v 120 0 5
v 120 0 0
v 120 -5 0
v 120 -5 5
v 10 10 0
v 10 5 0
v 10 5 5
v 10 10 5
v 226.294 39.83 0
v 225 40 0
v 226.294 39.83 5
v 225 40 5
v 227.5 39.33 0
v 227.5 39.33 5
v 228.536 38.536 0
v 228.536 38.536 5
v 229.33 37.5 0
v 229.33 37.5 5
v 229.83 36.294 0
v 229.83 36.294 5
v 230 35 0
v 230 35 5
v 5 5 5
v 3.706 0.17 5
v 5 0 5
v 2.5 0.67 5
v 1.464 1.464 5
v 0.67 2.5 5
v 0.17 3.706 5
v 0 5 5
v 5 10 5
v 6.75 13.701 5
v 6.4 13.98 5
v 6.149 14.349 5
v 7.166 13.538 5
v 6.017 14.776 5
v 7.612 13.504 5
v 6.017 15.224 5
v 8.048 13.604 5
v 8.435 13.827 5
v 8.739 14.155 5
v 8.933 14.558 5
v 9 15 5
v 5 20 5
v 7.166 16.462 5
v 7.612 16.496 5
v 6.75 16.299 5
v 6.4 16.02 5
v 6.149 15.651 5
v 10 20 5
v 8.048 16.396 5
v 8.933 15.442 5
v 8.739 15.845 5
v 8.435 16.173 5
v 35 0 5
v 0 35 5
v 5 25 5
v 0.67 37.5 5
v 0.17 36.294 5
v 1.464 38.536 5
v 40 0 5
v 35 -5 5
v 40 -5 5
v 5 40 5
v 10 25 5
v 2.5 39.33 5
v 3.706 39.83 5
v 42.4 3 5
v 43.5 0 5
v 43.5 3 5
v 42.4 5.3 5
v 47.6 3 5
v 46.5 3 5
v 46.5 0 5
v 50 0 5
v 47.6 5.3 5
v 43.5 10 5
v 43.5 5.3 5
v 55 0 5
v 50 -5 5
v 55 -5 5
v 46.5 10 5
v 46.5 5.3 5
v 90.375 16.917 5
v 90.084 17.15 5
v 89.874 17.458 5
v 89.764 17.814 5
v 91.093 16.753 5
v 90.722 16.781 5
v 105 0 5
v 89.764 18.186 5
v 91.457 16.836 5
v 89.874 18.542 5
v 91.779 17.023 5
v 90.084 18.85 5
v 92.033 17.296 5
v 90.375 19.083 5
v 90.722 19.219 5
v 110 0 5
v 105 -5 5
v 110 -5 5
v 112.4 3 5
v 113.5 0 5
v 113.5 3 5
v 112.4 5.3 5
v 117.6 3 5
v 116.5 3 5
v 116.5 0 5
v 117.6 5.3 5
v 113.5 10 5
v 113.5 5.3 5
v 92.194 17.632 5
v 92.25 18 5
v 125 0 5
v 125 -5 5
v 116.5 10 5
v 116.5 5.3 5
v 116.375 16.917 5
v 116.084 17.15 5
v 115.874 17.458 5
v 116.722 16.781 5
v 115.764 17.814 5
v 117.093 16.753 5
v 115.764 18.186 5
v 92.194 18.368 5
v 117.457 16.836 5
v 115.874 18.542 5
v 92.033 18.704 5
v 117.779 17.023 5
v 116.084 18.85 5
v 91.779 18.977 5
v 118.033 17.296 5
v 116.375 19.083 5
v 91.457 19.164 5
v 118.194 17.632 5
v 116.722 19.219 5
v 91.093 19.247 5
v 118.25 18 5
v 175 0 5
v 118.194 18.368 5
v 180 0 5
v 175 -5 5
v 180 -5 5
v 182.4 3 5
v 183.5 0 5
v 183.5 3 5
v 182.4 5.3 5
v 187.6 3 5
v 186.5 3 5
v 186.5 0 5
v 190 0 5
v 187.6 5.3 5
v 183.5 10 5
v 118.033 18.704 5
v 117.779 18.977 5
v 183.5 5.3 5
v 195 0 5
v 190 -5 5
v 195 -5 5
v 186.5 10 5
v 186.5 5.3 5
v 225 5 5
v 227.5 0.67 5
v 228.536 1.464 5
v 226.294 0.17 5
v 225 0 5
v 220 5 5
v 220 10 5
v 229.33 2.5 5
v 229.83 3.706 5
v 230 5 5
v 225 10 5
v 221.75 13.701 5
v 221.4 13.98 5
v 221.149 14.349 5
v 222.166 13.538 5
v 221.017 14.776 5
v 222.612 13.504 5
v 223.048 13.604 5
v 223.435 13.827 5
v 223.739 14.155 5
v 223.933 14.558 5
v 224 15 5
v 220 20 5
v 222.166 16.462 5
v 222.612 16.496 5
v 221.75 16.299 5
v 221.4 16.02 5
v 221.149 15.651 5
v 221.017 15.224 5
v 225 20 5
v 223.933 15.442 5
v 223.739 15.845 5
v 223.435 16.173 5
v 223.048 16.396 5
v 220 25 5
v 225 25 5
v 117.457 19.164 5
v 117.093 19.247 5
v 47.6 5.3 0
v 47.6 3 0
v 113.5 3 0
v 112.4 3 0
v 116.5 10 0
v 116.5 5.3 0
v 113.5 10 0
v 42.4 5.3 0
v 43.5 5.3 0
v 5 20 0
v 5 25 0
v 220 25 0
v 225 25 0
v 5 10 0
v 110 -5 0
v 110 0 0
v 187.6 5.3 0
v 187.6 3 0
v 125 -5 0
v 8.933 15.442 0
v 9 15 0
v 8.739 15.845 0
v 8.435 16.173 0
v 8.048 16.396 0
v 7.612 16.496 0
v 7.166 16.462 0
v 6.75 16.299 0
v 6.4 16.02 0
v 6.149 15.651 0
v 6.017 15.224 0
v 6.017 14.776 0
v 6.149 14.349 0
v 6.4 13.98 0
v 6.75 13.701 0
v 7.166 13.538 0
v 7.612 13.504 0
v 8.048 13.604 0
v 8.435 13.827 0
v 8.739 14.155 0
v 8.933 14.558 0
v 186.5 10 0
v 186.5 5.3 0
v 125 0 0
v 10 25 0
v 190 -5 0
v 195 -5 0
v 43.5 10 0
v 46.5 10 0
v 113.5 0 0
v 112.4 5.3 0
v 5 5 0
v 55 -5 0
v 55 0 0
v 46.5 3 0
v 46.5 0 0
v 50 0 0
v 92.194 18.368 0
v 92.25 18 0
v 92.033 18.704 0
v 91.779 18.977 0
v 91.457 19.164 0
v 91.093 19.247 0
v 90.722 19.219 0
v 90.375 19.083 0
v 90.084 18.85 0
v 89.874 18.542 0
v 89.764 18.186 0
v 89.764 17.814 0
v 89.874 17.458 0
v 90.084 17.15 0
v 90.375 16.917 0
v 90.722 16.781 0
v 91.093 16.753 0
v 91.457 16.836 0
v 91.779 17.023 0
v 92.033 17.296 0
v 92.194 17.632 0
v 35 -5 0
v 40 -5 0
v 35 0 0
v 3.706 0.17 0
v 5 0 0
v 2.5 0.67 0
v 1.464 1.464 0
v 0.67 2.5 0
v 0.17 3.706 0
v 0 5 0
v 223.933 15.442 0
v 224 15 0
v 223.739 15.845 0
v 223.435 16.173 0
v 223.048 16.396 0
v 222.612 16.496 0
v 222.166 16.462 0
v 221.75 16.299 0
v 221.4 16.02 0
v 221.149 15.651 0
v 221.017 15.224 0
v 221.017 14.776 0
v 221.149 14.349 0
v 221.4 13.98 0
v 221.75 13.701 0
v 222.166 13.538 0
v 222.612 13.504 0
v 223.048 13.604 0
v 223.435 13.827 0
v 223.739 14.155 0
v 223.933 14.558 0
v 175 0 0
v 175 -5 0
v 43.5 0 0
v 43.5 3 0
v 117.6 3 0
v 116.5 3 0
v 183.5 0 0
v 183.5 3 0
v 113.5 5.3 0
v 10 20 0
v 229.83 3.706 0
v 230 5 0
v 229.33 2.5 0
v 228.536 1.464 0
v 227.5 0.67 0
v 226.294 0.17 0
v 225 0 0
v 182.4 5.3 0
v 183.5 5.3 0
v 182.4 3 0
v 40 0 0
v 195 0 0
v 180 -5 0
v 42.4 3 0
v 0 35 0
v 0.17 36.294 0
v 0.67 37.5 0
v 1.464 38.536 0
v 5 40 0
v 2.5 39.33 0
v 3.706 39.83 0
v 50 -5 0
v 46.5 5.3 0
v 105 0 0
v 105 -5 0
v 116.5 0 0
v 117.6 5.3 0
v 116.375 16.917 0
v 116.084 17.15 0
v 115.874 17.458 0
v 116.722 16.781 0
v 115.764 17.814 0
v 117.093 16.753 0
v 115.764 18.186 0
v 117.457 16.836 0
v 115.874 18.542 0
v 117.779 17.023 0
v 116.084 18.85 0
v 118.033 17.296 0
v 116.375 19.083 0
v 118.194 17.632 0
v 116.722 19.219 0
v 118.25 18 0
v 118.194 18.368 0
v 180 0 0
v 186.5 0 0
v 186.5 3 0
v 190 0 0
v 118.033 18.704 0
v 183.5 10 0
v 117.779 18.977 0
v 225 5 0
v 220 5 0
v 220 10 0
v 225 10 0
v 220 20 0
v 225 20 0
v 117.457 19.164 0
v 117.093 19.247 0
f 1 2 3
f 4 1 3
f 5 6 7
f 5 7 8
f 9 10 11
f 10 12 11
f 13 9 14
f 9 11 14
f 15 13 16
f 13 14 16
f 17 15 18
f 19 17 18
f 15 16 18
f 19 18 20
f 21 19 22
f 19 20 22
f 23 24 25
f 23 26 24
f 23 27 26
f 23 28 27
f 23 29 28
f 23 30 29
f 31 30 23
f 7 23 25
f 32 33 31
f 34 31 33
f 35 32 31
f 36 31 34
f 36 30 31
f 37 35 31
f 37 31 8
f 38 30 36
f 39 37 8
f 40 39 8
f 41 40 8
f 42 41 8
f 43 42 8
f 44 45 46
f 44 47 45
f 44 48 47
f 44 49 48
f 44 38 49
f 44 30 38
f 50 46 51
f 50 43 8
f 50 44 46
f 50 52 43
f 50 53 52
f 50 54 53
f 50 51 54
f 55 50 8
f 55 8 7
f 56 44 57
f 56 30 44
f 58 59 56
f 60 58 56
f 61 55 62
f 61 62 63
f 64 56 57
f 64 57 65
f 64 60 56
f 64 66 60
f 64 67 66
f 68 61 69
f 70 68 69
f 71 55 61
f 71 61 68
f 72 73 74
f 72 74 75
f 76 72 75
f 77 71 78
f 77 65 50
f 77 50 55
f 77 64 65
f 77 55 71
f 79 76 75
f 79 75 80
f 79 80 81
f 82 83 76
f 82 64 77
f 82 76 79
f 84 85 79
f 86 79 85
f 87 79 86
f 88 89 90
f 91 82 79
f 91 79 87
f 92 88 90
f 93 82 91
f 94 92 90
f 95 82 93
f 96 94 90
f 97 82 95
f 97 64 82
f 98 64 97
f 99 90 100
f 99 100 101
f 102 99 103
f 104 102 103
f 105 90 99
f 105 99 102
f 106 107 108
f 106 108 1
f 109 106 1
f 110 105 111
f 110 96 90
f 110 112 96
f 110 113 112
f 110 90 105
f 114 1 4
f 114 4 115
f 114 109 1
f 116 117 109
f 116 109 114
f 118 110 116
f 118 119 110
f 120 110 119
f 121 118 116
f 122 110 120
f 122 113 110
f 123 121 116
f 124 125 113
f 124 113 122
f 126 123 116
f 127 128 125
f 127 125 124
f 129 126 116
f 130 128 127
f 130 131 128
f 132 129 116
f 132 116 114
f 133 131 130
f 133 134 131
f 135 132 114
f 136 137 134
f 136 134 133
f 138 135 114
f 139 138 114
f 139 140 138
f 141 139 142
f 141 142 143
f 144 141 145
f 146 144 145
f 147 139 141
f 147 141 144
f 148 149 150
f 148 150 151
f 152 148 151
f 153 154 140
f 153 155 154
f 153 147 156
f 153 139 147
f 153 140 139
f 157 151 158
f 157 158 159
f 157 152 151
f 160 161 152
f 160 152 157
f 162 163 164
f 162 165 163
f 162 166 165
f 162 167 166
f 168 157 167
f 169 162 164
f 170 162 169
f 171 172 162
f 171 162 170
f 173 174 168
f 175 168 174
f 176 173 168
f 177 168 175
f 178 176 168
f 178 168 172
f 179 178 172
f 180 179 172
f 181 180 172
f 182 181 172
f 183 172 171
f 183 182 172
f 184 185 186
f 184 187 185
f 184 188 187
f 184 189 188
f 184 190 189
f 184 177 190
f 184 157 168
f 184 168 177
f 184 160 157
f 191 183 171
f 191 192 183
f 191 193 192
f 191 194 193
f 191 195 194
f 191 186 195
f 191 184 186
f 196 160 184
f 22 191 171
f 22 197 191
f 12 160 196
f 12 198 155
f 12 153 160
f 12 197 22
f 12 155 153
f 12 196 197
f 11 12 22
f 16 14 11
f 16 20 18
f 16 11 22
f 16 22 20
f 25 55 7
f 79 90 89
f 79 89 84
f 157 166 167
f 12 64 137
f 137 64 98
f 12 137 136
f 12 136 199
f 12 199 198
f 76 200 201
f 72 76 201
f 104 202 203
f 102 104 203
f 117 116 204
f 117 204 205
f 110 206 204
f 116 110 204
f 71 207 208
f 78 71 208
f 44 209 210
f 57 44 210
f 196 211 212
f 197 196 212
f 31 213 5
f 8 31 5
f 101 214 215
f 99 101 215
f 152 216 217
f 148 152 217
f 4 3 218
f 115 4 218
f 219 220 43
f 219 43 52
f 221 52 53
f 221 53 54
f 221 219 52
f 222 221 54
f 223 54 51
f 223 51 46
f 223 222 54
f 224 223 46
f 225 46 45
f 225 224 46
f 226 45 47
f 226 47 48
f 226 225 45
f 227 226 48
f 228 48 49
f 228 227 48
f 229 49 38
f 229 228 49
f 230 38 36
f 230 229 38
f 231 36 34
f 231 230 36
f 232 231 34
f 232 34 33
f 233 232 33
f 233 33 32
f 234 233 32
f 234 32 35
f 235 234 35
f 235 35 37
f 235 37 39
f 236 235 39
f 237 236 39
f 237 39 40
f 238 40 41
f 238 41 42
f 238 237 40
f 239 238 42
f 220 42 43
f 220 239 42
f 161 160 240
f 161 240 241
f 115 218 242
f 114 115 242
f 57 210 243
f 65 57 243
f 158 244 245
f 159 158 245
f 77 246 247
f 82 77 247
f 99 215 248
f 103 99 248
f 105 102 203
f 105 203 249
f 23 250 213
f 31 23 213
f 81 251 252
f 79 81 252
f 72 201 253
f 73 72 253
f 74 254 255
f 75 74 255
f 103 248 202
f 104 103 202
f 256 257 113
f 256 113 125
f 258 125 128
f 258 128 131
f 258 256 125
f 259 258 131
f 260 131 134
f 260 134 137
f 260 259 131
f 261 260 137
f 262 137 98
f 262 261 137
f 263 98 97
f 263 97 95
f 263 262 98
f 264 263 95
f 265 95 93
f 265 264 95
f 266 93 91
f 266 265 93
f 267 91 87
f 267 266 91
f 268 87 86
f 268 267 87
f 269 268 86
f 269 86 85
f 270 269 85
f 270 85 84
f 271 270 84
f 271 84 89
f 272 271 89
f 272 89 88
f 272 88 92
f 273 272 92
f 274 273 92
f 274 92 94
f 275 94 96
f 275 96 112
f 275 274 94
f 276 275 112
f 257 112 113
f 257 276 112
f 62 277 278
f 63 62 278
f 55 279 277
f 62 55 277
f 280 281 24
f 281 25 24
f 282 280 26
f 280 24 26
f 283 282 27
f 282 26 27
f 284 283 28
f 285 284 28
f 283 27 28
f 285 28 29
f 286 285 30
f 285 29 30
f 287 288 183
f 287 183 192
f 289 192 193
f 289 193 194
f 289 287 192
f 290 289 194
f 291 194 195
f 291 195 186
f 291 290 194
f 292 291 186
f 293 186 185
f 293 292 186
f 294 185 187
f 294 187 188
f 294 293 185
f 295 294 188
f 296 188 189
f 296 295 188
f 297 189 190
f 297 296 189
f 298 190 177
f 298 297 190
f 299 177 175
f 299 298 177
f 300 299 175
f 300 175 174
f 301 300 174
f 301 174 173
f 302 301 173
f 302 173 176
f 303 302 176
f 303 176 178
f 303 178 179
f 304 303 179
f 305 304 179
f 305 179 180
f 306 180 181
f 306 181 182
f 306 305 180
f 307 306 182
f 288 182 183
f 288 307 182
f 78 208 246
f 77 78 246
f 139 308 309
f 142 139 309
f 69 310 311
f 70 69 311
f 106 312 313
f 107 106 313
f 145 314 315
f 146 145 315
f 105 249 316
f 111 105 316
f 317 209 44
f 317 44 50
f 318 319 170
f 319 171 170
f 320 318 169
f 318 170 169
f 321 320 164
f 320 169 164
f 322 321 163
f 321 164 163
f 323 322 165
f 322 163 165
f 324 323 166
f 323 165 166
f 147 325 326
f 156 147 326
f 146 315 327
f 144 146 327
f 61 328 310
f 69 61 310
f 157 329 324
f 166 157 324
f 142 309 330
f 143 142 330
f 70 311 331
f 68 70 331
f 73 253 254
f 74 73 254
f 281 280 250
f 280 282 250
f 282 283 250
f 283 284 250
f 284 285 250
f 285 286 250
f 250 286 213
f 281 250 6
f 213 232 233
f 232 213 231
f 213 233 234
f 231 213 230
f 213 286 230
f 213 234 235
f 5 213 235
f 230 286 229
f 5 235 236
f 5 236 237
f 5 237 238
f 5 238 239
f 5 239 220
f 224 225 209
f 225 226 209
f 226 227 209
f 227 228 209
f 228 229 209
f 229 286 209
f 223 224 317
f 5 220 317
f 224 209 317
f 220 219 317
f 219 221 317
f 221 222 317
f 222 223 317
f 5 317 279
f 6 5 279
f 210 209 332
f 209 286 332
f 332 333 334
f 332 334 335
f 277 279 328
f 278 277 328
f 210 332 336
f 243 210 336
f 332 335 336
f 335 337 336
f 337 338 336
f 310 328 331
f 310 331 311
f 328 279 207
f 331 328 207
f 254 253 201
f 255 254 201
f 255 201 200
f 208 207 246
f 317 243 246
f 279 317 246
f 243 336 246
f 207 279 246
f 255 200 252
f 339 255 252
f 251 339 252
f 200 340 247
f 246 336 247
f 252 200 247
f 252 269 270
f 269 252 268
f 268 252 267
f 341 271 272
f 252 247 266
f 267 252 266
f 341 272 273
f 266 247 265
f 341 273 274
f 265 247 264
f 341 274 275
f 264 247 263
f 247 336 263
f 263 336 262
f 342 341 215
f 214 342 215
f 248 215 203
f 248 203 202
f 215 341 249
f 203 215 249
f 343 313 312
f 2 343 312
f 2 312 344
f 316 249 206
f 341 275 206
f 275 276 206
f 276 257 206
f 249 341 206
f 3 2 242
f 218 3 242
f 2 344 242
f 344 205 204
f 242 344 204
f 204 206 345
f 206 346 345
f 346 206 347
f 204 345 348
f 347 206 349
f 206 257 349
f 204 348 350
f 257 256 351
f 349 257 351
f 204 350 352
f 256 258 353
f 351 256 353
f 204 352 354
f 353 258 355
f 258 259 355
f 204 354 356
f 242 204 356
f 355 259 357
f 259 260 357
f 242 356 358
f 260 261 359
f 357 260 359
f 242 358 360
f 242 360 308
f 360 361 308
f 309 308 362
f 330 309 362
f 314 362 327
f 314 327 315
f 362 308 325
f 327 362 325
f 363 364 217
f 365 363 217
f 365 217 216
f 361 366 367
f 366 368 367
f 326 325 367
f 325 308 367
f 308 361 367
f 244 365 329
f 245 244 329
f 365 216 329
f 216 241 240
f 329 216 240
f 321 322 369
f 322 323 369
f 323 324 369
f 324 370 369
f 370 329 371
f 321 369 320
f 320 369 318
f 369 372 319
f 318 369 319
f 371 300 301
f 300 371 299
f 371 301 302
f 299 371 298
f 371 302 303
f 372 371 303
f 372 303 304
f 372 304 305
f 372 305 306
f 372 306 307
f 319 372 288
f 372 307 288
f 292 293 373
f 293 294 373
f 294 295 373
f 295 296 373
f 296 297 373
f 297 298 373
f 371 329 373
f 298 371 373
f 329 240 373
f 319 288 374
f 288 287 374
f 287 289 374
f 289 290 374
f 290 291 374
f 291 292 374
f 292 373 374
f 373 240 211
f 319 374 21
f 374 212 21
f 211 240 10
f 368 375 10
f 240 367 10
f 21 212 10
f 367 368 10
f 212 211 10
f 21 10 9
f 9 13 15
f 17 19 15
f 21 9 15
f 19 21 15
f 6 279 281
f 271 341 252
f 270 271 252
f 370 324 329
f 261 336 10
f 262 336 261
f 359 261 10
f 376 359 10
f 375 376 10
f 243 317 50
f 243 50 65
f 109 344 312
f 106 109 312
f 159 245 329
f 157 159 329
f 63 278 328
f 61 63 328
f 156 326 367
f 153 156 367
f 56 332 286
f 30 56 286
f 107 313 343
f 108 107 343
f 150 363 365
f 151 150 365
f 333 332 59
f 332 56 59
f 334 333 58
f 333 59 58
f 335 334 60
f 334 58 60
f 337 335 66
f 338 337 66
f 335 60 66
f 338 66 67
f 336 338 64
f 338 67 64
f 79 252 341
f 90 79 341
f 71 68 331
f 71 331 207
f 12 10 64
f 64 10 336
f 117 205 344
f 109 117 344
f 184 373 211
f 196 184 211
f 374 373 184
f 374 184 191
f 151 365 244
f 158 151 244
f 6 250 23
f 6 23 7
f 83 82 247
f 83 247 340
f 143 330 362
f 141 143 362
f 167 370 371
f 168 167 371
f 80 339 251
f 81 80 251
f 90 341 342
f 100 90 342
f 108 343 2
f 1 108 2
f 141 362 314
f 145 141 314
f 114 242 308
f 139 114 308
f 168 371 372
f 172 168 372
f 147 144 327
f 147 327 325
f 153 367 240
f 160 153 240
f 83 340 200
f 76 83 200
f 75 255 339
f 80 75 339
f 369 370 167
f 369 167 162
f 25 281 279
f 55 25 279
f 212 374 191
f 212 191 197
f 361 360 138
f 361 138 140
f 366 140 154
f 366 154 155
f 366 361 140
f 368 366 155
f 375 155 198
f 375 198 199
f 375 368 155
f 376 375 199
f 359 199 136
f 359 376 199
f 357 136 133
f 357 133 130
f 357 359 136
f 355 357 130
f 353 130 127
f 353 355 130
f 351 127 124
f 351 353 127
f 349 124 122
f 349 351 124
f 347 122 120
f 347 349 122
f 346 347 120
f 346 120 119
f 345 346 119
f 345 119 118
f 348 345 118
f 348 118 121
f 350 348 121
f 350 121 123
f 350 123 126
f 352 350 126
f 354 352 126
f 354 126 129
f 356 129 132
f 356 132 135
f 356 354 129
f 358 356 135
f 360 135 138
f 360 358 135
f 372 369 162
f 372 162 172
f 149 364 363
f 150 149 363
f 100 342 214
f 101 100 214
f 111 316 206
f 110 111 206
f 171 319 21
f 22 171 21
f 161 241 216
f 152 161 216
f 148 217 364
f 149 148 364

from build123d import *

# Parameters (mm, degrees)
BOSS_EXTRU_1_OUTLINE_W   = 5
BOSS_EXTRU_1_OUTLINE_H   = 5
BOSS_EXTRU_1_OUTLINE_R   = 1.5
BOSS_EXTRU_1_OUTLINE_R_2 = 1.25
BOSS_EXTRU_1_DEPTH       = 5
CONG_1_R                 = 5


# Read off the part's stored shape, not the designer's step: Boss.-Extru.1
with BuildPart() as part:
    # Boss.-Extru.1 outline → Boss.-Extru.1 (new body)
    with BuildSketch(Plane.XY):
        Polygon((47.6, 5.3), (47.6, 3), (46.5, 3), (46.5, 0), (50, 0), (50, -5), (55, -5), (55, 0), (105, 0), (105, -5), (110, -5), (110, 0), (113.5, 0), (113.5, 3), (112.4, 3), (112.4, 5.3), (113.5, 5.3), (113.5, 10), (116.5, 10), (116.5, 5.3), (117.6, 5.3), (117.6, 3), (116.5, 3), (116.5, 0), (120, 0), (120, -5), (125, -5), (125, 0), (175, 0), (175, -5), (180, -5), (180, 0), (183.5, 0), (183.5, 3), (182.4, 3), (182.4, 5.3), (183.5, 5.3), (183.5, 10), (186.5, 10), (186.5, 5.3), (187.6, 5.3), (187.6, 3), (186.5, 3), (186.5, 0), (190, 0), (190, -5), (195, -5), (195, 0), (230, 0), (230, 40), (0, 40), (0, 0), (35, 0), (35, -5), (40, -5), (40, 0), (43.5, 0), (43.5, 3), (42.4, 3), (42.4, 5.3), (43.5, 5.3), (43.5, 10), (46.5, 10), (46.5, 5.3), align=None)
        with Locations((7.5, 7.5)):
            Rectangle(BOSS_EXTRU_1_OUTLINE_W, BOSS_EXTRU_1_OUTLINE_H, mode=Mode.SUBTRACT)
        with Locations((7.5, 15)):
            Circle(BOSS_EXTRU_1_OUTLINE_R, mode=Mode.SUBTRACT)
        with Locations((222.5, 7.5)):
            Rectangle(BOSS_EXTRU_1_OUTLINE_W, BOSS_EXTRU_1_OUTLINE_H, mode=Mode.SUBTRACT)
        with Locations((222.5, 15)):
            Circle(BOSS_EXTRU_1_OUTLINE_R, mode=Mode.SUBTRACT)
        with Locations((7.5, 22.5)):
            Rectangle(BOSS_EXTRU_1_OUTLINE_W, BOSS_EXTRU_1_OUTLINE_H, mode=Mode.SUBTRACT)
        with Locations((91, 18)):
            Circle(BOSS_EXTRU_1_OUTLINE_R_2, mode=Mode.SUBTRACT)
        with Locations((117, 18)):
            Circle(BOSS_EXTRU_1_OUTLINE_R_2, mode=Mode.SUBTRACT)
        with Locations((222.5, 22.5)):
            Rectangle(BOSS_EXTRU_1_OUTLINE_W, BOSS_EXTRU_1_OUTLINE_H, mode=Mode.SUBTRACT)
    extrude(amount=BOSS_EXTRU_1_DEPTH)

    # Congé1
    cong_1_edges = [part.edges().sort_by_distance(p)[0] for p in [
        (0, 0, 2.5),
        (0, 40, 2.5),
        (230, 40, 2.5),
        (230, 0, 2.5),
    ]]
    fillet(cong_1_edges, radius=CONG_1_R)


solid = part.part
